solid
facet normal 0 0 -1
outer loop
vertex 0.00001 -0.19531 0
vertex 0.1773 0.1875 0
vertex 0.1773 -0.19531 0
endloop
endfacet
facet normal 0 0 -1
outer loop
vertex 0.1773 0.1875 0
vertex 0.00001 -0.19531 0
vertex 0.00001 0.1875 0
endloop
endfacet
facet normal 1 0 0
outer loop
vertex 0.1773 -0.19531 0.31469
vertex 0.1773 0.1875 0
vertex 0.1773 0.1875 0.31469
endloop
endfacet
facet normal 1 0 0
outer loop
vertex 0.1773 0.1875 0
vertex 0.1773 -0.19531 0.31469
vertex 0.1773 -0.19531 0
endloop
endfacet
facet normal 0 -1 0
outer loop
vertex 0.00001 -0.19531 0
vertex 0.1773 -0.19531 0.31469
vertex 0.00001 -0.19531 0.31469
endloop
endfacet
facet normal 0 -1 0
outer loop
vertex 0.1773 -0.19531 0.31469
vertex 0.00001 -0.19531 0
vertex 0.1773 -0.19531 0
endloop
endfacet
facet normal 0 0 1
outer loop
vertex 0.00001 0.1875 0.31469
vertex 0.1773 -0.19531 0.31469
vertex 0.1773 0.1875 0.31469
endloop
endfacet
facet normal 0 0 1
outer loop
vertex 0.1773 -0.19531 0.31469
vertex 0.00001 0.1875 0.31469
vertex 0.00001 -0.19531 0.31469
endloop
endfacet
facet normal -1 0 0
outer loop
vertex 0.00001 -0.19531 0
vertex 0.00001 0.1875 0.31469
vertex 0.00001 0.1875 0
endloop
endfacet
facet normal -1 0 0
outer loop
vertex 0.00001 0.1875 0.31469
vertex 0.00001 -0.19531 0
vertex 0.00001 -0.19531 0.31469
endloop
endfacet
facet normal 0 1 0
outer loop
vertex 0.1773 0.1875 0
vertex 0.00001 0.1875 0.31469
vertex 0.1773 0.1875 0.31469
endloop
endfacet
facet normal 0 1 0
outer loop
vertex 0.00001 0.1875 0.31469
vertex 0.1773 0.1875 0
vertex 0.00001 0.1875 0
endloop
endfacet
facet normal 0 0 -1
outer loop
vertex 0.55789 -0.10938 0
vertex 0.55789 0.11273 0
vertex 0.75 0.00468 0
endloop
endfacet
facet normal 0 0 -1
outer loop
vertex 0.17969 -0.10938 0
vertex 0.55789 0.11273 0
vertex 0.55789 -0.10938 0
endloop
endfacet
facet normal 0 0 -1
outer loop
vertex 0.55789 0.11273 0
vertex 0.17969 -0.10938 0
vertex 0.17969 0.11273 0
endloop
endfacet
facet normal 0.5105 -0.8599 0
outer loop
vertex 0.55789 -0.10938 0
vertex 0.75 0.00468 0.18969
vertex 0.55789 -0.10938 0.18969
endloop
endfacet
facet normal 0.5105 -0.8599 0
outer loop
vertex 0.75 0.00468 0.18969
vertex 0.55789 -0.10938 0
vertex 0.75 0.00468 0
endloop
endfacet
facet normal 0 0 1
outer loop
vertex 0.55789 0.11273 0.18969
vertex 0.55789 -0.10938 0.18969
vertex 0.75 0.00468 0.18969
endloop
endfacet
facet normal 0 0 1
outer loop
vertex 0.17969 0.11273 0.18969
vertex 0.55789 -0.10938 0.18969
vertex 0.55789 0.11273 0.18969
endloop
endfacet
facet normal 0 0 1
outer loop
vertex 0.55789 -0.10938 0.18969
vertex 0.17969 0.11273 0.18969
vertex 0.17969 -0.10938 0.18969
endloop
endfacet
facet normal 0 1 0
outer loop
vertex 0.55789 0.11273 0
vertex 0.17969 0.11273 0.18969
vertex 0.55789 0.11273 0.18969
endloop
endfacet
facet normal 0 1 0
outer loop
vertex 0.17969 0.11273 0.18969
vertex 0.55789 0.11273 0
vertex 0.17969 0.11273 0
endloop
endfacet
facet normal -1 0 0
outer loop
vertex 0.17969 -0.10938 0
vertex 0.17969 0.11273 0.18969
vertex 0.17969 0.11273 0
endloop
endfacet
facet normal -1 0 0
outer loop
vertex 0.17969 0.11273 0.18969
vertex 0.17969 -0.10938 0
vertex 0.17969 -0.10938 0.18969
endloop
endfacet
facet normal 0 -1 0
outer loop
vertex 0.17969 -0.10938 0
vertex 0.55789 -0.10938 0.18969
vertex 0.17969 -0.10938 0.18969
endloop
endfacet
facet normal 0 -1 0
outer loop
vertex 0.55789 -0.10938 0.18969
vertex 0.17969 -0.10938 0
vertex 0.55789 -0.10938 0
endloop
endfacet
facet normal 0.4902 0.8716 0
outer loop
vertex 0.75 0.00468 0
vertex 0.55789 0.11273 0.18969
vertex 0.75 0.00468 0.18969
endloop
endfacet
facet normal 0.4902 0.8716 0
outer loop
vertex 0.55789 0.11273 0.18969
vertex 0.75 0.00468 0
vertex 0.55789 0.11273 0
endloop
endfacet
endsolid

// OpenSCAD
EPS = 0.01;

module sketch0() {
    translate([0.17730263157894738, -0.1953125, 0])
    linear_extrude(height=0.3046875 + EPS)
    polygon(points=[[0, 0], [0, 0.38281250000000006], [-0.17730263157894738, 0.38281250000000006], [-0.17730263157894738, 0]]);
}

module sketch1() {
    translate([0.1796875, -0.109375, 0])
    linear_extrude(height=0.1796875 + EPS)
    polygon(points=[[0.3782072368421052, 0], [0.5703125, 0.1140625], [0.3782072368421052, 0.22212171052631577], [0, 0.22212171052631577], [0, 0]]);
}

union() {
    sketch0();
    sketch1();
}
